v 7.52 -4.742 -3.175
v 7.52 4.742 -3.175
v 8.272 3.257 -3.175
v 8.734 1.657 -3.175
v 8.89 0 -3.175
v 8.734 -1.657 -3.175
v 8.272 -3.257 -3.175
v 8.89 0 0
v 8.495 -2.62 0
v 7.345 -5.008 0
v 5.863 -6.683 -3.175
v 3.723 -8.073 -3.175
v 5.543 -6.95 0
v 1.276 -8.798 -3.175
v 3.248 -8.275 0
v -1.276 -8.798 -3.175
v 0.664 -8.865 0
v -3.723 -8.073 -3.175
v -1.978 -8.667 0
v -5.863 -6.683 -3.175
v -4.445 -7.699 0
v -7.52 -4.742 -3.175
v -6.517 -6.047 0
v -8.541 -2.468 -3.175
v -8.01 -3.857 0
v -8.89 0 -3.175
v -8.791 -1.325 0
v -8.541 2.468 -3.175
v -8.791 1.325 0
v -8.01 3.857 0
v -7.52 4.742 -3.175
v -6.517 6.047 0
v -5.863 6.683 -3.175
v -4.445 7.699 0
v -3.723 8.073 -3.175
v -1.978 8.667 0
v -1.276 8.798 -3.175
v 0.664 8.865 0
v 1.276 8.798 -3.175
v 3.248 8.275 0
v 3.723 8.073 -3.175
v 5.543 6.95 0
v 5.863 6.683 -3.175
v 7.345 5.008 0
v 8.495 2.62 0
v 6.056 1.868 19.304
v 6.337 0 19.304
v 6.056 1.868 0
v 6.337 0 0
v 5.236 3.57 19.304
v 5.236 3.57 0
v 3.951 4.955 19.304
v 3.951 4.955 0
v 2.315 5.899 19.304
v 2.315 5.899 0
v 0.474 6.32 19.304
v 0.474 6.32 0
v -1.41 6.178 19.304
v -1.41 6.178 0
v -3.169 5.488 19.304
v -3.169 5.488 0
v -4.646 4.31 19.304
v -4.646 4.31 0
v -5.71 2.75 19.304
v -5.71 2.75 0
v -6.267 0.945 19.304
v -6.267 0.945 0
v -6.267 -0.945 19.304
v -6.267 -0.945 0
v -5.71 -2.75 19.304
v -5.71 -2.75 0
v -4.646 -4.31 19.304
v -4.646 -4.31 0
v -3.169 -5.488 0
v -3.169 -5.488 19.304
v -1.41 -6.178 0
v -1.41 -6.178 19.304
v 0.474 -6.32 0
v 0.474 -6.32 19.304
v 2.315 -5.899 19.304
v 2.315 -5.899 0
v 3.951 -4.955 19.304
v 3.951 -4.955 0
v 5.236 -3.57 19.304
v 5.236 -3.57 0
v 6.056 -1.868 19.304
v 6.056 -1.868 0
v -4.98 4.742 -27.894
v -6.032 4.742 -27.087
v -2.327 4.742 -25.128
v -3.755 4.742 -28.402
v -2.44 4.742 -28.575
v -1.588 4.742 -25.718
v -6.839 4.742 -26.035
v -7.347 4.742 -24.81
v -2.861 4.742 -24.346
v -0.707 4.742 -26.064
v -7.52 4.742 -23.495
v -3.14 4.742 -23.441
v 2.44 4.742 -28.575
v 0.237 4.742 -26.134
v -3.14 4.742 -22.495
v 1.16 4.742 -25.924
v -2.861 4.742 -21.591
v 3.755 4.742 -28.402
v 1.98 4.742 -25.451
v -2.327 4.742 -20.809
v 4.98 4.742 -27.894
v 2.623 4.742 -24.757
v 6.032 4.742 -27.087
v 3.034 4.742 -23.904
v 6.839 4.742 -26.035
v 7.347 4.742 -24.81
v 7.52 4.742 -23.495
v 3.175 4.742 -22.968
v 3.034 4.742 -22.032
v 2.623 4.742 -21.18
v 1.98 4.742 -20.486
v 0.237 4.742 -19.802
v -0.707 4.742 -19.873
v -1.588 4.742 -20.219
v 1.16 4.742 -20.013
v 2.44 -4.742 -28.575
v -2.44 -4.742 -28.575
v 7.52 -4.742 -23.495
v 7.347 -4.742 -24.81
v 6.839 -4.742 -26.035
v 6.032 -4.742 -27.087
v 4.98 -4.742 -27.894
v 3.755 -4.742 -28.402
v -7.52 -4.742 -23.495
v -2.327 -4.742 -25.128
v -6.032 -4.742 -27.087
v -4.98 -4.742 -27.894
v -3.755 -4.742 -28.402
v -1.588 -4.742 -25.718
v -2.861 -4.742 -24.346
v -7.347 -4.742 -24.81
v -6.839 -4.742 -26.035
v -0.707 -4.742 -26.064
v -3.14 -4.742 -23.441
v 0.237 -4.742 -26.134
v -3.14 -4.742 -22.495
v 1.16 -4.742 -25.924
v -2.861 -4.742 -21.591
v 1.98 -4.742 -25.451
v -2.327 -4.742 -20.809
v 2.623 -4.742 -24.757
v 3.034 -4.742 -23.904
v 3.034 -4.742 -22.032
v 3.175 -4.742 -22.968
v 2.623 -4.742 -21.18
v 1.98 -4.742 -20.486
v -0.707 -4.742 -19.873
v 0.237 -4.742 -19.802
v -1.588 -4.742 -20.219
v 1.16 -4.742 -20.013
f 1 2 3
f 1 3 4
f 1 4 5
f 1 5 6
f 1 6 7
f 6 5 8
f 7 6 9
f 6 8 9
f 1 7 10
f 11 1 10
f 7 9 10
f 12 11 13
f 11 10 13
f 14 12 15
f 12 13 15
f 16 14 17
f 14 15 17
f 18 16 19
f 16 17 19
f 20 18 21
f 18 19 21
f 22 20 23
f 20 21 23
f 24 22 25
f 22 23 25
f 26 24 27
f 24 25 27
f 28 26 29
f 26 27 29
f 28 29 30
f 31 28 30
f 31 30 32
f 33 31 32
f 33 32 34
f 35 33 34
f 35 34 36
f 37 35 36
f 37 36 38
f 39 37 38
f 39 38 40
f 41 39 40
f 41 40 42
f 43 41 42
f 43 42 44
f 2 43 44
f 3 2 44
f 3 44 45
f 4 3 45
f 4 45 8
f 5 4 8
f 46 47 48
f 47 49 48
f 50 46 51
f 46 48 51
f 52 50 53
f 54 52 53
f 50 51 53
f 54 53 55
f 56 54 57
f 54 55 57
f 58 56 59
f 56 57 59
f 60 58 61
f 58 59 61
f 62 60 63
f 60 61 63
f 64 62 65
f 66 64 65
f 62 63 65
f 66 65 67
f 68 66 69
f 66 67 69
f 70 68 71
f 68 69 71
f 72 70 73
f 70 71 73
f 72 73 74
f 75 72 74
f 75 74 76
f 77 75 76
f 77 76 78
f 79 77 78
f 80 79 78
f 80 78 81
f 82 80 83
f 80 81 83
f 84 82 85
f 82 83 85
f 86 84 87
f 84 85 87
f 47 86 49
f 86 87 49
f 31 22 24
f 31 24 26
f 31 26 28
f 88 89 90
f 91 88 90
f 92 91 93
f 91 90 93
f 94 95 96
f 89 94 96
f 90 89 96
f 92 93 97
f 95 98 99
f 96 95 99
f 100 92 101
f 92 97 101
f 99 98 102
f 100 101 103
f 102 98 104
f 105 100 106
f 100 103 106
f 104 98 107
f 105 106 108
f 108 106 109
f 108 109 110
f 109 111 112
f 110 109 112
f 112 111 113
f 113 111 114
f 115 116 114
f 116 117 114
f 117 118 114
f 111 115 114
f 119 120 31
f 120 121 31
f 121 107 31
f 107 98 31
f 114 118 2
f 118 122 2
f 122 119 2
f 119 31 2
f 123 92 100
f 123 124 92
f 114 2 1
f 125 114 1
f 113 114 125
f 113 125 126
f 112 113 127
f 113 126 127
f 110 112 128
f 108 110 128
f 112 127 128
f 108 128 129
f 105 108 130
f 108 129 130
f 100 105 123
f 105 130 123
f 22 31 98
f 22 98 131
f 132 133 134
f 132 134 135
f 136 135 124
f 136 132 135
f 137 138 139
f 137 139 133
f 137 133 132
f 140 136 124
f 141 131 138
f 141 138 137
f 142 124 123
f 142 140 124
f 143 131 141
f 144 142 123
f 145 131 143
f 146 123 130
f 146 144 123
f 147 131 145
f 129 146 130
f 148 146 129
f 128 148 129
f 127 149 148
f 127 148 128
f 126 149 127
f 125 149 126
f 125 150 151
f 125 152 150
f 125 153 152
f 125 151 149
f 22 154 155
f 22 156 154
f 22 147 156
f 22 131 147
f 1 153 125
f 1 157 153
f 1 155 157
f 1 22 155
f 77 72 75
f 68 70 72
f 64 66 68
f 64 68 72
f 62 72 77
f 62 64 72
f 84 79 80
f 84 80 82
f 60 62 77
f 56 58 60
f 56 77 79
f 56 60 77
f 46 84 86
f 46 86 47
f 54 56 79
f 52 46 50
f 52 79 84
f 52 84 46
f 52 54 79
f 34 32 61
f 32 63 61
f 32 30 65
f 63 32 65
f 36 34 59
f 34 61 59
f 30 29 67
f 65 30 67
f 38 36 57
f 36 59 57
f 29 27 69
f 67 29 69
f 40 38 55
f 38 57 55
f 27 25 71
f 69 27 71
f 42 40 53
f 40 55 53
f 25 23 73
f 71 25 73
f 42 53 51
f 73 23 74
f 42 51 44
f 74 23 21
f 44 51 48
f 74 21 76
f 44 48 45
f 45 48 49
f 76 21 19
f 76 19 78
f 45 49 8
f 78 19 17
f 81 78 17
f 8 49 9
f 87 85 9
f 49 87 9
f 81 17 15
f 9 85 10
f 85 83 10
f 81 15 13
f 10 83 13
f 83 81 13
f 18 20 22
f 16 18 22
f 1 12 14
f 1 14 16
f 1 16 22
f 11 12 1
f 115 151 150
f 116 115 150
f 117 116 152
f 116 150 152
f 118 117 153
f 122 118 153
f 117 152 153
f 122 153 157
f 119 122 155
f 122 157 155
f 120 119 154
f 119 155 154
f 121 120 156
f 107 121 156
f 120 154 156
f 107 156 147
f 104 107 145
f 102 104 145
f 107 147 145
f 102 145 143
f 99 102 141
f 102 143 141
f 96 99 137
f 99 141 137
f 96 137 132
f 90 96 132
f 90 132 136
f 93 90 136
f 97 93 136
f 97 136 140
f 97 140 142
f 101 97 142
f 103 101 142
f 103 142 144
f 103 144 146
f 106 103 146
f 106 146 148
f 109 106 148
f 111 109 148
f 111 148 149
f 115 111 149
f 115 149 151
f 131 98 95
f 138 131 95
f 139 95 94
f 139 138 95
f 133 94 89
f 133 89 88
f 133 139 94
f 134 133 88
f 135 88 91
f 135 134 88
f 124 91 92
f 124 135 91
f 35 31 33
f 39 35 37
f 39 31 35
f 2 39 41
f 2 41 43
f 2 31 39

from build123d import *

# Parameters (mm, degrees)
F0_R     = 6.3373
F1_DEPTH = 6.604
F2_R     = 8.89
F3_DEPTH = 3.175
F4_W     = 15.0394464063
F4_H     = 9.4838521599
F5_DEPTH = 25.4
F6_R     = 3.175
F7_DEPTH = 25.4
F8_R     = 5.08
F9_DEPTH = 12.7


with BuildPart() as f1:
    # F0 (on Top) → F1 (new body)
    with BuildSketch(Plane.XY):
        Circle(F0_R)
    extrude(amount=F1_DEPTH)

    # F2 (on face) → F3 (join)
    with BuildSketch(Plane(origin=(0, 0, 0), x_dir=(1, 0, 0), z_dir=(0, 0, -1))):
        Circle(F2_R)
    extrude(amount=F3_DEPTH)

    # F4 (on face) → F5 (join)
    with BuildSketch(Plane(origin=(0, 0, -3.175), x_dir=(1, 0, 0), z_dir=(0, 0, -1))):
        Rectangle(F4_W, F4_H)
    extrude(amount=F5_DEPTH)

    # F6 (on face) → F7 (cut)
    with BuildSketch(Plane.XZ.offset(4.74192608)):
        with Locations((0, -22.9682382196)):
            Circle(F6_R)
    extrude(amount=-F7_DEPTH, mode=Mode.SUBTRACT)

    # F8
    f8_edges = [f1.edges().sort_by_distance(p)[0] for p in [
        (-7.519723, 0, -28.575),
        (7.519723, 0, -28.575),
    ]]
    fillet(f8_edges, radius=F8_R)

    # F9 (add): a face of the model
    f9_faces = [f1.faces().sort_by_distance(p)[0] for p in [
        (0, 0, 6.604),
    ]]
    extrude(f9_faces, amount=F9_DEPTH)


solid = f1.part
